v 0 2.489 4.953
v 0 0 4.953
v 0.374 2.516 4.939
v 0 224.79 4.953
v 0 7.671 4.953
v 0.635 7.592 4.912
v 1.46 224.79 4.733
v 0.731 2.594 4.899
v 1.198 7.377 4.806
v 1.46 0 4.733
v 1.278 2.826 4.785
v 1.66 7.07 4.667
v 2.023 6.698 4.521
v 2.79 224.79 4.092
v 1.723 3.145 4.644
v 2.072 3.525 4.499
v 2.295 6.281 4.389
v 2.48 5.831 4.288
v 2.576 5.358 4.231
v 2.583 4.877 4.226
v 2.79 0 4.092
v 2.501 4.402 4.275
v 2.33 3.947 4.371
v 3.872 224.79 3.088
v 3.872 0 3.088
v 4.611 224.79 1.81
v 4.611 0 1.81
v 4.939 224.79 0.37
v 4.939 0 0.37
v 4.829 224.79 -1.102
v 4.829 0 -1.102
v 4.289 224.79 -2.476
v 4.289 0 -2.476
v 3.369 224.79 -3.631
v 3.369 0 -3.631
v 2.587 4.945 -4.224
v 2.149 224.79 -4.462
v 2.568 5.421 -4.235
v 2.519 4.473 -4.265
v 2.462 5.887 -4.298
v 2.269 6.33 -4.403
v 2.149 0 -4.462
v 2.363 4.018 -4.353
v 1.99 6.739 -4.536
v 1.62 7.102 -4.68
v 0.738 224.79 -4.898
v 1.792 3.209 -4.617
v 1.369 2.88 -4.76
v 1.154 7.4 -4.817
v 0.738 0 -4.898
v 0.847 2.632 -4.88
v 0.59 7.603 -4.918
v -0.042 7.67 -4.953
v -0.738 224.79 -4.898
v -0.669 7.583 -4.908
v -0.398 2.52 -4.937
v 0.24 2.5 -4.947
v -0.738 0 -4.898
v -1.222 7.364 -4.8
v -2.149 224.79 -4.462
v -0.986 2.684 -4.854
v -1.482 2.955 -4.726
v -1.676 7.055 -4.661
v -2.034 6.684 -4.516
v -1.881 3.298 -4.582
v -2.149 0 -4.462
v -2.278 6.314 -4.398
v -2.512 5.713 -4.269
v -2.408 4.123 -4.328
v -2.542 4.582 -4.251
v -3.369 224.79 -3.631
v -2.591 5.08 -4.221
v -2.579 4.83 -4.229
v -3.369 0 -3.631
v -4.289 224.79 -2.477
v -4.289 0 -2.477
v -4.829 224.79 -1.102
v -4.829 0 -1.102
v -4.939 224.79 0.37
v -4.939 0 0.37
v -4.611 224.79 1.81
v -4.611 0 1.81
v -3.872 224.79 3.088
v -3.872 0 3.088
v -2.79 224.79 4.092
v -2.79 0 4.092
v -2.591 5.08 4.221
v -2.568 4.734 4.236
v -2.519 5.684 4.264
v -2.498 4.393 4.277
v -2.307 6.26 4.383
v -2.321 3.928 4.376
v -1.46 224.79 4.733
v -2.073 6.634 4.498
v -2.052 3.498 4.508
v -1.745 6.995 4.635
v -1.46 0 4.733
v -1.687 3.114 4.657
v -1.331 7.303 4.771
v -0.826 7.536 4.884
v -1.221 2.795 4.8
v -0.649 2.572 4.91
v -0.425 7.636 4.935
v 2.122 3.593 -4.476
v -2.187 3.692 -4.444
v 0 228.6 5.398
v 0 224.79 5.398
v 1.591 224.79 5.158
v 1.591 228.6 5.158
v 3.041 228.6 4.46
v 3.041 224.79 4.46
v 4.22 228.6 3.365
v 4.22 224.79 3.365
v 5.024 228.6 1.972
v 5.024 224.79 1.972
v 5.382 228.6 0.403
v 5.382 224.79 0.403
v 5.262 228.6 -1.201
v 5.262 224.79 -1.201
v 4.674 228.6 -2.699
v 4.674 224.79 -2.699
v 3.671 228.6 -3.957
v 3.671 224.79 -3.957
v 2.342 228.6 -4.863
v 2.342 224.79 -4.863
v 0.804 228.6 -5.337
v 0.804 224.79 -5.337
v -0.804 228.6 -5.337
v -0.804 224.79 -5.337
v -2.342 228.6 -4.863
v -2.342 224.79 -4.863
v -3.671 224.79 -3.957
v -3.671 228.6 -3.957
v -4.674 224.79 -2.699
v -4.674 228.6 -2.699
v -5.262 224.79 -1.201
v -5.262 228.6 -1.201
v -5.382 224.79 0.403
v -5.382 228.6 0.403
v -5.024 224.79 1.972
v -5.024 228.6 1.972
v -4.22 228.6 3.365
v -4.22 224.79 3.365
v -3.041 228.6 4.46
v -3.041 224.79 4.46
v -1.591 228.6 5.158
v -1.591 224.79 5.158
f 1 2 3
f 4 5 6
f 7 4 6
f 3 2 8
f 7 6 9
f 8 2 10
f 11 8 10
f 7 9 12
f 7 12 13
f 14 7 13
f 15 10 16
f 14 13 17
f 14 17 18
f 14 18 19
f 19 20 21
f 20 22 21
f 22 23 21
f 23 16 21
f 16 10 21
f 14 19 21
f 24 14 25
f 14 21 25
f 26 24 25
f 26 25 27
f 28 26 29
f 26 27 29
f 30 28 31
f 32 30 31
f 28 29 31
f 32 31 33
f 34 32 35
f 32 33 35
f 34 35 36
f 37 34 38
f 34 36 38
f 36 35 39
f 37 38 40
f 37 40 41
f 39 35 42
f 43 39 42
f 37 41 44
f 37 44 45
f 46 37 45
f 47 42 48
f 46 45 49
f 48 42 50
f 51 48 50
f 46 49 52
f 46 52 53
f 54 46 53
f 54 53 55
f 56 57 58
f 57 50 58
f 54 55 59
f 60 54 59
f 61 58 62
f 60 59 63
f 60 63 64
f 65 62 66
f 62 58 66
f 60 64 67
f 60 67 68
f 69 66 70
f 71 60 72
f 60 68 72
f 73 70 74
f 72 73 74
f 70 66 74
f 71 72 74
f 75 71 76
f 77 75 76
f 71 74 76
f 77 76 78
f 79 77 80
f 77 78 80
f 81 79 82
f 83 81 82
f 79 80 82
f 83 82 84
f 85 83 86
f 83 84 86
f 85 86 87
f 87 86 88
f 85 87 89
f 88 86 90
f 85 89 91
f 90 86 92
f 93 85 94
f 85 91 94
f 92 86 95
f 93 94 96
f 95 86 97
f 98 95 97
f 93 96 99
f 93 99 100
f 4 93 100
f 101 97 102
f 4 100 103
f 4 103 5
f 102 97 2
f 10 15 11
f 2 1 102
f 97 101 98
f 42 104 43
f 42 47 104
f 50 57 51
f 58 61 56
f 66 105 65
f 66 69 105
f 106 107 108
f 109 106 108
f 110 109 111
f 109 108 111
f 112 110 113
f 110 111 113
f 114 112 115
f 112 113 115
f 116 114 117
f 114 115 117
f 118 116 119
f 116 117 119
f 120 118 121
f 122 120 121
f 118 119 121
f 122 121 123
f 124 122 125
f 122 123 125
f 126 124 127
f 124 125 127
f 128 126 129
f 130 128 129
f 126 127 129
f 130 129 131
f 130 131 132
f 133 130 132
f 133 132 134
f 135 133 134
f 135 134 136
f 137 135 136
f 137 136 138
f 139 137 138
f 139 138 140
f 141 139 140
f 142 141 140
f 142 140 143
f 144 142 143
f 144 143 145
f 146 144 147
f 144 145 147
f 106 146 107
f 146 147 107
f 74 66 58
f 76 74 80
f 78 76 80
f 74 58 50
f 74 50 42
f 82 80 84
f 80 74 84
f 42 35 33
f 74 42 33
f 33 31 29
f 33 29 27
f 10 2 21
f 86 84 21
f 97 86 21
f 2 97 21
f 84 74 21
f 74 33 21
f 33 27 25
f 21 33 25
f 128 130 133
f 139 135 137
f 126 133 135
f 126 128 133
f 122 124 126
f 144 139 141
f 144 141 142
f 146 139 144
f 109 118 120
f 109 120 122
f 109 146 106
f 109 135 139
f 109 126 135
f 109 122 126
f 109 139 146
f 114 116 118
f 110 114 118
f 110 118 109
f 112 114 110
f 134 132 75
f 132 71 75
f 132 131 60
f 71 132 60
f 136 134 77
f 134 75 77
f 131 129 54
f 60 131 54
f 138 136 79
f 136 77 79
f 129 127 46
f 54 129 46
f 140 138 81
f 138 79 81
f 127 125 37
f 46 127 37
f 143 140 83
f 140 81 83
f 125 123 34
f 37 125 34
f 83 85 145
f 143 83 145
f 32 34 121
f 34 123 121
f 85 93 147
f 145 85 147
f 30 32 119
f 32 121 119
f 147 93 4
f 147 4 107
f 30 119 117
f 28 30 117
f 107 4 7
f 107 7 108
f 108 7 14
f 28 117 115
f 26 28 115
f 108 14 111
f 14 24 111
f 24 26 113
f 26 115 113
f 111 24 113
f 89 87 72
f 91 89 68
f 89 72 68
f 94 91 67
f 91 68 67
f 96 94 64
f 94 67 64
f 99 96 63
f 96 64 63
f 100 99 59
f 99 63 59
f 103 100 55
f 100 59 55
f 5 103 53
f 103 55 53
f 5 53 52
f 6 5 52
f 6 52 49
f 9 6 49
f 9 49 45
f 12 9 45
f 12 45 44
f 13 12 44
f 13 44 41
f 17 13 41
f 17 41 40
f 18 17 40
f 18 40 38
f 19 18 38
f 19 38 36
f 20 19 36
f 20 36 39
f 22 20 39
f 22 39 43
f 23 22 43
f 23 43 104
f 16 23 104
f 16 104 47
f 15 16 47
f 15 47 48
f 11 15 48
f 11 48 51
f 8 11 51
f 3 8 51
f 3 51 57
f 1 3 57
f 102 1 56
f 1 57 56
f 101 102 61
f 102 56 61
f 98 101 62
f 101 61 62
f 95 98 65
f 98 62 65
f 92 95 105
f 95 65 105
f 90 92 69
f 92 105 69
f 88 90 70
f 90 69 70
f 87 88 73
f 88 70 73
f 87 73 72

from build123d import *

# Parameters (mm, degrees)
SKETCH1_R                  = 4.953
BOSS_EXTRUDE1_DEPTH        = 228.6
BOSS_EXTRUDE2_START        = -3.81
SKETCH2_R                  = 5.3975
SKETCH2_R_2                = 4.953
BOSS_EXTRUDE2_DEPTH        = 3.81
F_6_0_204_DIAMETER_HOLE1_D = 5.1816


with BuildPart() as part:
    # Sketch1 → Boss-Extrude1 (new body)
    with BuildSketch(Plane(origin=(0, 0, 0), x_dir=(1, 0, 0), z_dir=(0, 1, 0))):
        with Locations(Location((0, 0, 0), (0, 0, 270))):
            Circle(SKETCH1_R)
    extrude(amount=BOSS_EXTRUDE1_DEPTH)

    # Sketch2 → Boss-Extrude2 (add)
    with BuildSketch(Plane(origin=(0, 228.6, 0), x_dir=(1, 0, 0), z_dir=(0, 1, 0)).offset(BOSS_EXTRUDE2_START)):
        with Locations(Location((0, 0, 0), (0, 0, 270))):
            Circle(SKETCH2_R)
        with Locations(Location((0, 0, 0), (0, 0, 270))):
            Circle(SKETCH2_R_2, mode=Mode.SUBTRACT)
    extrude(amount=BOSS_EXTRUDE2_DEPTH)

    # #6 (0.204) Diameter Hole1 (through all)
    with Locations(Plane.XY.offset(4.953)):
        with Locations((0, 5.08)):
            Hole(F_6_0_204_DIAMETER_HOLE1_D / 2)


solid = part.part
